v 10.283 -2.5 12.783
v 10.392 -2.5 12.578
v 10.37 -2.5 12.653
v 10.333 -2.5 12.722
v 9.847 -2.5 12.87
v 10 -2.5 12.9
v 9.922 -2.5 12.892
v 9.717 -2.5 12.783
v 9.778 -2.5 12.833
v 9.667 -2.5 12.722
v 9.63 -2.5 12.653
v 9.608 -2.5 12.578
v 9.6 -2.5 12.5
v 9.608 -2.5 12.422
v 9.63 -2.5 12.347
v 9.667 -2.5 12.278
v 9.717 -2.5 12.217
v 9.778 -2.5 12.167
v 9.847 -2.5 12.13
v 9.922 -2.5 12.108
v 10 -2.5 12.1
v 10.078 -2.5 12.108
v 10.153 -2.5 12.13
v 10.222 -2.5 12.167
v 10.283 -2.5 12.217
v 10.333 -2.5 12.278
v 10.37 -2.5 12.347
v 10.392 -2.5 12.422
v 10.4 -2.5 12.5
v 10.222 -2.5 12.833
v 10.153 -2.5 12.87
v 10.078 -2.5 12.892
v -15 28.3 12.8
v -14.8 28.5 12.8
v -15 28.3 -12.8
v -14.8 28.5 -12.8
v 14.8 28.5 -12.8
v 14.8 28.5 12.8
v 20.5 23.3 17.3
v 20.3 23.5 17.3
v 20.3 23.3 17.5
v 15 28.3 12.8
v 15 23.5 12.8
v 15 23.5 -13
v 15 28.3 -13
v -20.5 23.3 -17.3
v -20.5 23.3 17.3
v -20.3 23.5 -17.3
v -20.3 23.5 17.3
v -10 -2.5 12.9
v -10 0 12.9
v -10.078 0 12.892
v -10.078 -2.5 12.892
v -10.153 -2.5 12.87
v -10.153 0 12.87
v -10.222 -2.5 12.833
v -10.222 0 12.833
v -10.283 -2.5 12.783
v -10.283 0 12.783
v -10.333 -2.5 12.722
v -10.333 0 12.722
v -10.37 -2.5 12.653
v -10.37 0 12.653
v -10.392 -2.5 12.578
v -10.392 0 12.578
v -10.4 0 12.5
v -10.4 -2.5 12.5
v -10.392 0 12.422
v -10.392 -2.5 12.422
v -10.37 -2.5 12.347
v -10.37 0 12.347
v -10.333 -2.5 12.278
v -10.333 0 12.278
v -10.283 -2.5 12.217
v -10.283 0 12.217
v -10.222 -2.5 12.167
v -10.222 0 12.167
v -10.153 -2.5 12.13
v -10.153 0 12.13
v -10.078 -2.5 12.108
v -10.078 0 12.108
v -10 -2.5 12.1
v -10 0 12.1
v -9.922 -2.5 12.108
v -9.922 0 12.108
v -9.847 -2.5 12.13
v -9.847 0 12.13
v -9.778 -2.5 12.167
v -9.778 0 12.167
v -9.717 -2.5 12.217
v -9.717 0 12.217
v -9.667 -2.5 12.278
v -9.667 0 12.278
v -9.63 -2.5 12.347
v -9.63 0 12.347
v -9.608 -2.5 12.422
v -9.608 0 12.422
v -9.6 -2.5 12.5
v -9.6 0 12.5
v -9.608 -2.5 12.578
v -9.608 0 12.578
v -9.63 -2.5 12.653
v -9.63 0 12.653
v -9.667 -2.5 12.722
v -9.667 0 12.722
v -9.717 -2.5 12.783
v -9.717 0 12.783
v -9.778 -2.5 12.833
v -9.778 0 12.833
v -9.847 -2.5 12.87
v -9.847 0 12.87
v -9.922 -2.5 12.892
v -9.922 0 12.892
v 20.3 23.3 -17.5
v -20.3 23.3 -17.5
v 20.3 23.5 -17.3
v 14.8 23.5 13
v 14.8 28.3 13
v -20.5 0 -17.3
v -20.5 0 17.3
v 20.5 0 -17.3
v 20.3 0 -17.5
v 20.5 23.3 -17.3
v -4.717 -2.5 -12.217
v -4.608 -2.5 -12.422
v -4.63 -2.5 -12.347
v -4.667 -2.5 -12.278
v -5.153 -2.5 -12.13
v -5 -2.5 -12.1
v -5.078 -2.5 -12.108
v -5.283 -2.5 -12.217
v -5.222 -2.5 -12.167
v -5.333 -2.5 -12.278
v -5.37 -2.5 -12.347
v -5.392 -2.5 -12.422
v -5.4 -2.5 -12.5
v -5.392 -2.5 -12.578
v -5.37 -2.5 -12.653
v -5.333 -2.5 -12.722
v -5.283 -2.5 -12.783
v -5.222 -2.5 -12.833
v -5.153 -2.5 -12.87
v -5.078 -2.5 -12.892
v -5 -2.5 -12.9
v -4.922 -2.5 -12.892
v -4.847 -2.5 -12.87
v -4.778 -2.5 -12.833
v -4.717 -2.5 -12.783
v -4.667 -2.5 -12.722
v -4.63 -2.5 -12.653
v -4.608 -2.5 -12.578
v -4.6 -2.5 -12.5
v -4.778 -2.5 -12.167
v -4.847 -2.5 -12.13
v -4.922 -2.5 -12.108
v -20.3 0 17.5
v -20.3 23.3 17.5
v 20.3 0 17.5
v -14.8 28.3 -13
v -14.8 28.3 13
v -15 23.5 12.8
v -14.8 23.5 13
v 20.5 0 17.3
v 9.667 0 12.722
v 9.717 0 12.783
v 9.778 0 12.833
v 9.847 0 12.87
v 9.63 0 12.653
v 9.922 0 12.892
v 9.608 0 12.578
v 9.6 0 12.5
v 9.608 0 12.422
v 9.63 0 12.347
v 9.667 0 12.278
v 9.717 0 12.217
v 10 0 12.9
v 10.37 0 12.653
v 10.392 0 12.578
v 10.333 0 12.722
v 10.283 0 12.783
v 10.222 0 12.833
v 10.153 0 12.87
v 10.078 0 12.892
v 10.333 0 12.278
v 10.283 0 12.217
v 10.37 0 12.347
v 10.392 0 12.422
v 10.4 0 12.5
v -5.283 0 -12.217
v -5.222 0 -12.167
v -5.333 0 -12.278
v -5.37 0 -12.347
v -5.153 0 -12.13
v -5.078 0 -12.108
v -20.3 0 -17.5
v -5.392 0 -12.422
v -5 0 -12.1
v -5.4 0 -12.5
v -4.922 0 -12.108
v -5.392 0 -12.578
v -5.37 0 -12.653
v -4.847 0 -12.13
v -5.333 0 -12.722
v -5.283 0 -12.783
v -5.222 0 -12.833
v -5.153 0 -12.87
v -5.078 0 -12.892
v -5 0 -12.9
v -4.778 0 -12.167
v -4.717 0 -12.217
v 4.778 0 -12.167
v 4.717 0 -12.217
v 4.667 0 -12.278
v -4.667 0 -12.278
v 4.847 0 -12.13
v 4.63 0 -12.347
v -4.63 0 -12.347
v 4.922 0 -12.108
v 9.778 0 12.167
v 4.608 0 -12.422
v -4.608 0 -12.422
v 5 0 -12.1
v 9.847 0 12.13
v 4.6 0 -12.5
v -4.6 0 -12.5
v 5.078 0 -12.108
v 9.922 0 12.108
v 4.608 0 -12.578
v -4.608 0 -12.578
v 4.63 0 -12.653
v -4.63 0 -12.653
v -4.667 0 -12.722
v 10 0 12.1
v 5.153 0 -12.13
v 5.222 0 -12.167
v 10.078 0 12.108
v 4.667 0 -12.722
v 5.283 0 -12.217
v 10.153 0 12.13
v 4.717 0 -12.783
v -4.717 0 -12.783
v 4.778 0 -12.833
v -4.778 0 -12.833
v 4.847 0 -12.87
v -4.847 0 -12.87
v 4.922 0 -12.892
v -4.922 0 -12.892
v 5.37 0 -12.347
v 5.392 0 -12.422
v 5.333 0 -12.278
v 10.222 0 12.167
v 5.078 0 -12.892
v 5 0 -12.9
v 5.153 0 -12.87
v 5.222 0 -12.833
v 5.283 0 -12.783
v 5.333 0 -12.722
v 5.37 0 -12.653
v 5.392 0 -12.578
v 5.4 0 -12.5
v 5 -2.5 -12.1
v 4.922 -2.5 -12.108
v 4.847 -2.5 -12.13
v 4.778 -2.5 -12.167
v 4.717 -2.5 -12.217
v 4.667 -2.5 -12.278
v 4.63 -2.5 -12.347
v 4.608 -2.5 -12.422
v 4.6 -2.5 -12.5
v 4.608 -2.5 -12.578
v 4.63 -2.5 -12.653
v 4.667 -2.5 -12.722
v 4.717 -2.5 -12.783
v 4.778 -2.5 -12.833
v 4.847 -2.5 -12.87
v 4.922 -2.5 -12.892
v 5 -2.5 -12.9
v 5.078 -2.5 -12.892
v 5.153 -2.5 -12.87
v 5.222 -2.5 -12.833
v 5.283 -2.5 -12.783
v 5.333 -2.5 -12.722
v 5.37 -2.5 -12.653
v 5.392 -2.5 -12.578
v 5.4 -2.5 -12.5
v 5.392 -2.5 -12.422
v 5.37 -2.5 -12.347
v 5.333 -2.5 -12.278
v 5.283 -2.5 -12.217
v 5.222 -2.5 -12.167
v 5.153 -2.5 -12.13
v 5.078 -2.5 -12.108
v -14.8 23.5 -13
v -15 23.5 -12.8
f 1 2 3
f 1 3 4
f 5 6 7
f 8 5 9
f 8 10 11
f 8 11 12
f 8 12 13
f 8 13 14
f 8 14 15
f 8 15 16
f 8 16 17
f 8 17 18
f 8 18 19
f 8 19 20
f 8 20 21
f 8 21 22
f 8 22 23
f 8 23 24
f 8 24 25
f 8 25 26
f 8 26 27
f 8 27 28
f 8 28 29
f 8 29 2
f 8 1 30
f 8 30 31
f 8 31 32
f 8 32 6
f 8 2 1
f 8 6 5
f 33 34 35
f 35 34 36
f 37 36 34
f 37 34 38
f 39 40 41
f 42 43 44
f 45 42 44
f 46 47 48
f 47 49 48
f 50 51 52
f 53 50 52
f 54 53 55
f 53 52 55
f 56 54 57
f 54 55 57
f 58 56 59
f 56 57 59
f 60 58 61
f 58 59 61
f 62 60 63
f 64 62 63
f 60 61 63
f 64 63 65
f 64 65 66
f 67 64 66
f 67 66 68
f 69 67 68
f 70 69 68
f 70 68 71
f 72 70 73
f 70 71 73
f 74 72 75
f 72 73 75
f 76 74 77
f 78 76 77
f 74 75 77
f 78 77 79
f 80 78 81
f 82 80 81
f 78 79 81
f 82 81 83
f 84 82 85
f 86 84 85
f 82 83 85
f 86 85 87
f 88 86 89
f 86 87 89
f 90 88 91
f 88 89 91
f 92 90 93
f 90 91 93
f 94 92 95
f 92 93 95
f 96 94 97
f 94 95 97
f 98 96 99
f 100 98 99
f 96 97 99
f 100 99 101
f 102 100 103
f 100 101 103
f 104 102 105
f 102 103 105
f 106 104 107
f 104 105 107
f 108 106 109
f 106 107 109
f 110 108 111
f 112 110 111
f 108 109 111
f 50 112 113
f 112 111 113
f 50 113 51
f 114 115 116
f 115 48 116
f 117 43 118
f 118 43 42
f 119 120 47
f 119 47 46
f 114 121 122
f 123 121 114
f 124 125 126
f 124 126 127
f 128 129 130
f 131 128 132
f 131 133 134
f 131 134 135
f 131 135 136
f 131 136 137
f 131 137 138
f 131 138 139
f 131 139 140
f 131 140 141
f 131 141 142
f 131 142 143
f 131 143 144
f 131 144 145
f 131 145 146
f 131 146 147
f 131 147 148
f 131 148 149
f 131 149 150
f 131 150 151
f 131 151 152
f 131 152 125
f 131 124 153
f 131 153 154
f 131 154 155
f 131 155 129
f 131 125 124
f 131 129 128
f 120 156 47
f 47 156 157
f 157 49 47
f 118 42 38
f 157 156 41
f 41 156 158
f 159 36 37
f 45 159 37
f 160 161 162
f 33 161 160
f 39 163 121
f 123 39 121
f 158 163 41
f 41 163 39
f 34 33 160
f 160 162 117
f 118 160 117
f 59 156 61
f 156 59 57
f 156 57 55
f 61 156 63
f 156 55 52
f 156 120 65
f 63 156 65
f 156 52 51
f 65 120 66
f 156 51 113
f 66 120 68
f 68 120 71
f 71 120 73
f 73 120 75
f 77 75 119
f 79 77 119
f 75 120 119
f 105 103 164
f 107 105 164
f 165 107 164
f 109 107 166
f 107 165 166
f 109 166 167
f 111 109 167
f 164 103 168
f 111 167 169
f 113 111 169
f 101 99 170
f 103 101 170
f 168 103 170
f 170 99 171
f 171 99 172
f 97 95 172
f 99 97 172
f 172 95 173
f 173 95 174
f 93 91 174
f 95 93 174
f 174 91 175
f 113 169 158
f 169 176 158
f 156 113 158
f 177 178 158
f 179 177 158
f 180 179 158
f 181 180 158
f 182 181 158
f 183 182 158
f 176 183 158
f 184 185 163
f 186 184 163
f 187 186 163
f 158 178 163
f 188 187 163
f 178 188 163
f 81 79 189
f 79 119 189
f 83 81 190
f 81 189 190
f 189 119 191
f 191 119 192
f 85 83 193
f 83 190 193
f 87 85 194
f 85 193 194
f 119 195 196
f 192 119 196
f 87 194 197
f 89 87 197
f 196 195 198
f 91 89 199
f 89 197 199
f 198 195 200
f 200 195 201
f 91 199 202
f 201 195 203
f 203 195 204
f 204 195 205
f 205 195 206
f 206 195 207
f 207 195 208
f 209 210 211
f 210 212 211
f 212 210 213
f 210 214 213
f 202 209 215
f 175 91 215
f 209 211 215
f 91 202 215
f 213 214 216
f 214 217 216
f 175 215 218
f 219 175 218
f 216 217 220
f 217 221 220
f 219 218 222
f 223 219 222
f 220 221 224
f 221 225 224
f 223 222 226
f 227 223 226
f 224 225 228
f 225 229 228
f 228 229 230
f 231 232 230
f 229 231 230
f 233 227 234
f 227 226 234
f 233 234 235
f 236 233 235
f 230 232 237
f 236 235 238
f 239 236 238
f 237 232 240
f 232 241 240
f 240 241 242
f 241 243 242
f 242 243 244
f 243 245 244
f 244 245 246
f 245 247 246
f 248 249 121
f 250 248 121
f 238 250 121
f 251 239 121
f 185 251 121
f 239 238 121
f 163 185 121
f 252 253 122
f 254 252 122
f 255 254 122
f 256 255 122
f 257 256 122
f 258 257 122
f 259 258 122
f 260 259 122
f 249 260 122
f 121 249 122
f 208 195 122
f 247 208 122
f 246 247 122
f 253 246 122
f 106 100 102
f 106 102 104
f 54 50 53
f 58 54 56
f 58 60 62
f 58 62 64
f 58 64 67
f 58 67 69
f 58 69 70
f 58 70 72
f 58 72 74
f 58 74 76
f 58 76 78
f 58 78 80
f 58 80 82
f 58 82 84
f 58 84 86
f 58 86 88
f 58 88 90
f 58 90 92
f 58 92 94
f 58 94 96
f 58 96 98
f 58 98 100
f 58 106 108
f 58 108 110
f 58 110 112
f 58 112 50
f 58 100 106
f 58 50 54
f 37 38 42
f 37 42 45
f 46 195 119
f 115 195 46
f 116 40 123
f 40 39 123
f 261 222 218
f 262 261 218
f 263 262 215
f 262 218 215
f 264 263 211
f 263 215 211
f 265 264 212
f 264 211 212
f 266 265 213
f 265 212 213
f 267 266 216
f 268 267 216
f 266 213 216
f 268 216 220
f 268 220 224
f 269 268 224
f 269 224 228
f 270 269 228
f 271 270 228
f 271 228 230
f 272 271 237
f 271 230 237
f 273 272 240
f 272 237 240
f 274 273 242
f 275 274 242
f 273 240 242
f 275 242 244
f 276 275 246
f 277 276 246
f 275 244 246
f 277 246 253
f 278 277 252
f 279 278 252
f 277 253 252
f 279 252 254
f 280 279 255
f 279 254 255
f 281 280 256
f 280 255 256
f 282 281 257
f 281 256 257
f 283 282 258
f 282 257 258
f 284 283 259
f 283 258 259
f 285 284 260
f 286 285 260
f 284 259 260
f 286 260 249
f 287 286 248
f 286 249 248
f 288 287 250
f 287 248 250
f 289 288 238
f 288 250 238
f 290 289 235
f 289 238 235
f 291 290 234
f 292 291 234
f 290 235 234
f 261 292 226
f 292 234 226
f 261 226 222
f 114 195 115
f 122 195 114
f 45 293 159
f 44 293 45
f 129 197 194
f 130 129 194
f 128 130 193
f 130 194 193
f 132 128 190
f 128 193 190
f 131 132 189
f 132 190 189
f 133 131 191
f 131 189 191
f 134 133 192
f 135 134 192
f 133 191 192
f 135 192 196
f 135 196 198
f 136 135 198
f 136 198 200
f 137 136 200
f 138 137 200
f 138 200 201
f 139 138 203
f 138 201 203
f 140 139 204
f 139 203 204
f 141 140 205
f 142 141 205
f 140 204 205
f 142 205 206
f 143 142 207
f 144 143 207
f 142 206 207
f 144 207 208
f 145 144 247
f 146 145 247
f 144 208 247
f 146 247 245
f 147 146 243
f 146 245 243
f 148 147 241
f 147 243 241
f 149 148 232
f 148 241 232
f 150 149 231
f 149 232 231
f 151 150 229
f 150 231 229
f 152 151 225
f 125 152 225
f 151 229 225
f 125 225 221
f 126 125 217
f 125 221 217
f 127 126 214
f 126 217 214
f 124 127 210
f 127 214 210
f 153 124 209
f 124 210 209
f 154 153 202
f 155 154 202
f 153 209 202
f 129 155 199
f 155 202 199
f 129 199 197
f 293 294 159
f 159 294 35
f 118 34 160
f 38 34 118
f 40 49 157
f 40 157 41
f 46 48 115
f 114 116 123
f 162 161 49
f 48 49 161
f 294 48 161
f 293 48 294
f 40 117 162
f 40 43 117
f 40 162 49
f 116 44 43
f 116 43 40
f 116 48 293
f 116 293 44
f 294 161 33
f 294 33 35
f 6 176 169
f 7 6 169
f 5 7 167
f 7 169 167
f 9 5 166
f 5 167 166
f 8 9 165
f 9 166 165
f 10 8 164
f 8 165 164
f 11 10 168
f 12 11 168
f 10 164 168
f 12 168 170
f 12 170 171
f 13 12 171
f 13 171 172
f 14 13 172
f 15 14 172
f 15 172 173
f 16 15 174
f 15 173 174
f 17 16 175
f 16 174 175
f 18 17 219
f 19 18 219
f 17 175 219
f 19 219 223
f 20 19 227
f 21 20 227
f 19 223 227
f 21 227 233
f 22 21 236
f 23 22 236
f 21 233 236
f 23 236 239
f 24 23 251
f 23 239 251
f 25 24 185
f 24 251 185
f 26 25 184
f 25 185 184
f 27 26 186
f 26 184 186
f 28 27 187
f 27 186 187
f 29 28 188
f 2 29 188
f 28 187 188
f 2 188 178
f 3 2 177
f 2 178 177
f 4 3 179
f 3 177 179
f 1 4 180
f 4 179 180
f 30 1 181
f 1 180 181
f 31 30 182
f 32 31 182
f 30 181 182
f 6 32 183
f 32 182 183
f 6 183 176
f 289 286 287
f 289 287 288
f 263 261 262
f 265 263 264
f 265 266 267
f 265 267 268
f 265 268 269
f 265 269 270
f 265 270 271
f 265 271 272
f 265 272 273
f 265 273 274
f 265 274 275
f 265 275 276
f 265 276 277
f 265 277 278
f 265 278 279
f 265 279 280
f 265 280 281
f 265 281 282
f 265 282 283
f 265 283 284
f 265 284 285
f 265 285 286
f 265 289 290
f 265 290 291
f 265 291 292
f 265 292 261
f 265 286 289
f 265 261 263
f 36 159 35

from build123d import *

# Parameters (mm, degrees)
SKETCH2_W           = 41
SKETCH2_H           = 35
BOSS_EXTRUDE1_DEPTH = 23.5
SKETCH3_W           = 30
SKETCH3_H           = 26
BOSS_EXTRUDE2_DEPTH = 5
SKETCH4_R           = 0.4
BOSS_EXTRUDE3_DEPTH = 2.5
CHAMFER1_SIZE       = 0.2


with BuildPart() as part:
    # Sketch2 → Boss-Extrude1 (new body)
    with BuildSketch(Plane(origin=(0, 0, 0), x_dir=(1, 0, 0), z_dir=(0, 1, 0))):
        Rectangle(SKETCH2_W, SKETCH2_H)
    extrude(amount=BOSS_EXTRUDE1_DEPTH)

    # Sketch3 → Boss-Extrude2 (add)
    with BuildSketch(Plane(origin=(0, 23.5, 0), x_dir=(1, 0, 0), z_dir=(0, 1, 0))):
        Rectangle(SKETCH3_W, SKETCH3_H)
    extrude(amount=BOSS_EXTRUDE2_DEPTH)

    # Sketch4 → Boss-Extrude3 (add)
    with BuildSketch(Plane.XZ):
        with Locations(Location((-10, 12.5, 0), (0, 0, 90))):
            Circle(SKETCH4_R)
        with Locations(Location((10, 12.5, 0), (0, 0, 90))):
            Circle(SKETCH4_R)
        with Locations(Location((-5, -12.5, 0), (0, 0, 90))):
            Circle(SKETCH4_R)
        with Locations(Location((5, -12.5, 0), (0, 0, 90))):
            Circle(SKETCH4_R)
    extrude(amount=BOSS_EXTRUDE3_DEPTH)

    # Chamfer1
    chamfer1_edges = [part.edges().sort_by_distance(p)[0] for p in [
        (20.5, 23.5, 0),
        (0, 23.5, -17.5),
        (15, 26, 13),
        (-15, 26, -13),
        (-15, 26, 13),
        (15, 28.5, 0),
        (0, 28.5, -13),
        (-15, 28.5, 0),
        (0, 28.5, 13),
        (-20.5, 23.5, 0),
        (0, 23.5, 17.5),
        (-20.5, 11.75, -17.5),
        (20.5, 11.75, -17.5),
        (20.5, 11.75, 17.5),
        (-20.5, 11.75, 17.5),
    ]]
    chamfer(chamfer1_edges, length=CHAMFER1_SIZE)


solid = part.part
